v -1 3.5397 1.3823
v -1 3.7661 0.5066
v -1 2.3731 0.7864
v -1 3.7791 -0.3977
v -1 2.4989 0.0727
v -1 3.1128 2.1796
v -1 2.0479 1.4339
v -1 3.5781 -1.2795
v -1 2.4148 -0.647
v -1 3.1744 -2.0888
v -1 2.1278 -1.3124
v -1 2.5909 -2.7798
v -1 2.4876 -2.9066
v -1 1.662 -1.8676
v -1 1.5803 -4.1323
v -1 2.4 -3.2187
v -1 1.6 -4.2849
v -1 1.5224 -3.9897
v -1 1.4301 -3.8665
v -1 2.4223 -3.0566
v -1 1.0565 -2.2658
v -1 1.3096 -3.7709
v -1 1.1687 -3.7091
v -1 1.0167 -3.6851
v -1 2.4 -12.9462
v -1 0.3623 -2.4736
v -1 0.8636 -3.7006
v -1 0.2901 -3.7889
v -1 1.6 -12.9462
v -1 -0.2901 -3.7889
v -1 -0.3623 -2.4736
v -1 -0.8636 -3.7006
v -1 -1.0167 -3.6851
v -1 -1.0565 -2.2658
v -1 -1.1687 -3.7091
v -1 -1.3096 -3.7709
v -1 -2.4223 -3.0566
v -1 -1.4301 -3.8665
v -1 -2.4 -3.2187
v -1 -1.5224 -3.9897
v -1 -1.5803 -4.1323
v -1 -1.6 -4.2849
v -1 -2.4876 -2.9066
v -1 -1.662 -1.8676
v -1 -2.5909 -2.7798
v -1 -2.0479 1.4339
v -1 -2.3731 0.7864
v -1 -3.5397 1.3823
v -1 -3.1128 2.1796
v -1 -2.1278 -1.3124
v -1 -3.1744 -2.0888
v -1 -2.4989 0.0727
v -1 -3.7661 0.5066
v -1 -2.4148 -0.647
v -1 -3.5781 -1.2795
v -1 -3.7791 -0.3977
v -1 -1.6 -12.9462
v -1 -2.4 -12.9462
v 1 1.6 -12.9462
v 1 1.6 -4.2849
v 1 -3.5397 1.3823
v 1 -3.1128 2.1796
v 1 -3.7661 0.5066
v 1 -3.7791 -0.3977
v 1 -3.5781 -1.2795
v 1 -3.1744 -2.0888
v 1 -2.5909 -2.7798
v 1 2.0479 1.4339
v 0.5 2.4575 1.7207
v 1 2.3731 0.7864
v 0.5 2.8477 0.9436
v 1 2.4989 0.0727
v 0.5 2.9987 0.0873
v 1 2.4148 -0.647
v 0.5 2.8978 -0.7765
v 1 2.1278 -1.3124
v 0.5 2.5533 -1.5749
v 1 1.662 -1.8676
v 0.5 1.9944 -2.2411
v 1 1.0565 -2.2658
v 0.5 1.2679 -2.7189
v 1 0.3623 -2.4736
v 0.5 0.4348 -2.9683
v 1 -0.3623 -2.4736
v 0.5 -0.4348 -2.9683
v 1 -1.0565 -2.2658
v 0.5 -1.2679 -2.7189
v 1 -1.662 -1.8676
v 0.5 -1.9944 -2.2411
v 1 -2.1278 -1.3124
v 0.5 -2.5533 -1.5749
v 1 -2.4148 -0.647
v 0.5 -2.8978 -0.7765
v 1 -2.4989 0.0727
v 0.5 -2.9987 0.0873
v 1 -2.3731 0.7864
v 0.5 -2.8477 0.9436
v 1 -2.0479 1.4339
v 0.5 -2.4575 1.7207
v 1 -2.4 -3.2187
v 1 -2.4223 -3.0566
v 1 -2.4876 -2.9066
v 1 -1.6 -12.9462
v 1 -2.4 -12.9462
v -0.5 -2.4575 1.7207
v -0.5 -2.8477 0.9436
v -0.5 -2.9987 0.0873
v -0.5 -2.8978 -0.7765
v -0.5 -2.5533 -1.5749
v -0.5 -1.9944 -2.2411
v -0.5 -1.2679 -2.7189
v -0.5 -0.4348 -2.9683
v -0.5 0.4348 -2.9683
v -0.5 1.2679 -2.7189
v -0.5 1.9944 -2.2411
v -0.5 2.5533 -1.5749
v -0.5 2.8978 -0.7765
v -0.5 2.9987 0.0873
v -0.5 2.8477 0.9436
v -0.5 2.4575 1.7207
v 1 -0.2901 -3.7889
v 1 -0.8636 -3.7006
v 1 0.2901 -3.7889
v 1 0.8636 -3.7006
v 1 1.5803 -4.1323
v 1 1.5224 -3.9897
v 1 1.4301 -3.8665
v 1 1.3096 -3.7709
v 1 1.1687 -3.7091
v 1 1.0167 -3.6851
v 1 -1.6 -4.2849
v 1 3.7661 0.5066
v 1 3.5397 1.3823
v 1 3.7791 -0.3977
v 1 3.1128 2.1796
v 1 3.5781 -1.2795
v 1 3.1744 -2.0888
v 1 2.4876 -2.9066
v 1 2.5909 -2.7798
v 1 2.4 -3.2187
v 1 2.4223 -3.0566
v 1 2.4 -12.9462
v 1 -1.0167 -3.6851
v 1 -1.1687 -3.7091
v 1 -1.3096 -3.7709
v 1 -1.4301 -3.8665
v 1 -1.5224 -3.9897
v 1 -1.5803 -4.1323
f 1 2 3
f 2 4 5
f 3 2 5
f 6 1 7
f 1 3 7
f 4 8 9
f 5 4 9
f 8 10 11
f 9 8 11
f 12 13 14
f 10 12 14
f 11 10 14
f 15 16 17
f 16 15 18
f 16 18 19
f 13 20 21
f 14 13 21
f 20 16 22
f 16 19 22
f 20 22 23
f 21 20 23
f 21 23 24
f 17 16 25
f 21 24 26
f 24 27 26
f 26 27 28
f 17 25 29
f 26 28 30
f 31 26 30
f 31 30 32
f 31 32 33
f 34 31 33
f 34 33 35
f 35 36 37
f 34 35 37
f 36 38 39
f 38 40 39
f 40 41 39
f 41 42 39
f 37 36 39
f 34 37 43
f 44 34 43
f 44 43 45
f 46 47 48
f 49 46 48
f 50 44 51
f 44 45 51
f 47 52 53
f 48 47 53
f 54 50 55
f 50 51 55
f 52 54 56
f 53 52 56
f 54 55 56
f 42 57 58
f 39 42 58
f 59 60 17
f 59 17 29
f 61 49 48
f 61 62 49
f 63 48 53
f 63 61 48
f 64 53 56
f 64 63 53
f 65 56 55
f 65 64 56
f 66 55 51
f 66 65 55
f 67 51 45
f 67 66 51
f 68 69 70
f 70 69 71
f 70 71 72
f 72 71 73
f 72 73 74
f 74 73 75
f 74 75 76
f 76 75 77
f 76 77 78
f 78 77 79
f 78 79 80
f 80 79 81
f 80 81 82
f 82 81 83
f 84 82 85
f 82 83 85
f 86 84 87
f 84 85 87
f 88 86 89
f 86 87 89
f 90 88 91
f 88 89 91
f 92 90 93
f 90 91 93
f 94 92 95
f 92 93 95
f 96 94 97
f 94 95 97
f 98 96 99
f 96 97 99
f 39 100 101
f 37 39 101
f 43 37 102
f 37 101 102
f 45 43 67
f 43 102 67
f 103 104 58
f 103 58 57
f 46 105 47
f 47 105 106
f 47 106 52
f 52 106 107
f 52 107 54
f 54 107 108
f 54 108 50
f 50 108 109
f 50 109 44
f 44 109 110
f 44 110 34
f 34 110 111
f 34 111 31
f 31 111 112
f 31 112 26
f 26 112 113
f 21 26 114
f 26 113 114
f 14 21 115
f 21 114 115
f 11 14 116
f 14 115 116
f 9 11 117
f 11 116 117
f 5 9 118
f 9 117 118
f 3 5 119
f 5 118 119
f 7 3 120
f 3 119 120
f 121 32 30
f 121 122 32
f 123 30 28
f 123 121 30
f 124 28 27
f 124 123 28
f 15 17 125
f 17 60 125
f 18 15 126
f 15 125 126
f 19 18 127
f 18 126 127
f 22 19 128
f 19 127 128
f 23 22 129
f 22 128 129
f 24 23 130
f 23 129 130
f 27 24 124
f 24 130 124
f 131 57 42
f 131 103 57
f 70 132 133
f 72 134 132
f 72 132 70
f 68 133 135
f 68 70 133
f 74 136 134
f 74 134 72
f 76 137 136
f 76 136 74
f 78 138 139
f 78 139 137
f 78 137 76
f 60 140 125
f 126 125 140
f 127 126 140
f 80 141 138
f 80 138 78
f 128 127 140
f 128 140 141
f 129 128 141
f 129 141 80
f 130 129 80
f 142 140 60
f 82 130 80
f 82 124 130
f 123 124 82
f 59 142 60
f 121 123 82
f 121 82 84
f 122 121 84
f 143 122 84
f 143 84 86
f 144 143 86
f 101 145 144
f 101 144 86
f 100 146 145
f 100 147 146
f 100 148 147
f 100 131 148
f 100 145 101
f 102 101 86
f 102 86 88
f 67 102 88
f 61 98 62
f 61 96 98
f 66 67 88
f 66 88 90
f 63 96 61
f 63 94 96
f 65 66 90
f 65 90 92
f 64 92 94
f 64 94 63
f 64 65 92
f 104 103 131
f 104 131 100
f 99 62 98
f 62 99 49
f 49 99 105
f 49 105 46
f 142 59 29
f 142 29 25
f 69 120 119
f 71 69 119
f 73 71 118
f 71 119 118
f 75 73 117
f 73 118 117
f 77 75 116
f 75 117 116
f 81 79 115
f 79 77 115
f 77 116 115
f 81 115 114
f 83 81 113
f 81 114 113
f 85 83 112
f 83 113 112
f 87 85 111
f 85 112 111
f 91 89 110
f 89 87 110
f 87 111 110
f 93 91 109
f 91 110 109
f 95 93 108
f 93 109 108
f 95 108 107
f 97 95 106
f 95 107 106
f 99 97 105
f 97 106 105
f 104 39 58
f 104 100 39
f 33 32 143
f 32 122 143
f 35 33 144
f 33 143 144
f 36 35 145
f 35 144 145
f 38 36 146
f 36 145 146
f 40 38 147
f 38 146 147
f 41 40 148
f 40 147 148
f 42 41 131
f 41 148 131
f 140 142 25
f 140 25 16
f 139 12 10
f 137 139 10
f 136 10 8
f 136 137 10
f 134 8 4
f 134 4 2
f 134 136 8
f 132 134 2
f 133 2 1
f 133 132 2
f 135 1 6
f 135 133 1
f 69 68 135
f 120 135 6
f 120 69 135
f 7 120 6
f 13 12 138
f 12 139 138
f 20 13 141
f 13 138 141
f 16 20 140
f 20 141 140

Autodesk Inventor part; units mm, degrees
ref_plane "YZ Plane" through (0, 0, 0) normal (1, 0, 0) x (0, 1, 0)
ref_plane "XZ Plane" through (0, 0, 0) normal (0, 1, 0) x (-1, 0, 0)
ref_plane "XY Plane" through (0, 0, 0) normal (0, 0, 1) x (1, 0, 0)
sketch "Sketch4" plane through (0, 0, 0) normal (0, 1, 0) x (-1, 0, 0)
  line L0 (1, -2.5) -> (1, -3.8)
  line L1 (1, -3.8) -> (-1, -3.8)
  line L2 (-1, -3.8) -> (-1, -2.5)
  line L3 (-1, -2.5) -> (-0.5, -3)
  line L4 (-0.5, -3) -> (0.5, -3)
  line L5 (0.5, -3) -> (1, -2.5)
  line L6 (0, 0) -> (-1.4783, 0)
  point P0 (0, -3)
  dimension "d21" = 1
  dimension "d22" = 3
  dimension "d24" = 0.8
  dimension "d32" = 0.5
revolve "Revolution1" add sketch "Sketch4" angle 250 mid plane about axis through (0, 0, 0) along (1, 0, 0)
sketch "Sketch5" plane through (1, 0, 0) normal (1, 0, 0) x (0, 0, -1)
  arc A0 (-2.1796, -3.1128) -> (-2.1796, 3.1128) centre (0, 0) ccw projected
  line L0 (2.9462, -2.4) -> (12.9462, -2.4)
  line L1 (12.9462, -2.4) -> (12.9462, -1.6)
  line L2 (12.9462, -1.6) -> (3.4467, -1.6)
  line L3 (3.4467, 1.6) -> (12.9462, 1.6)
  line L4 (12.9462, 1.6) -> (12.9462, 2.4)
  line L5 (12.9462, 2.4) -> (2.9462, 2.4)
  point P0 (0, 0)
  point P1 (12.9462, 2)
  point P2 (12.9462, -2)
  dimension "d26" = 0.8
  dimension "d27" = 10
  dimension "d28" = 4
  dimension "d10" = 1.5
  dimension "d11" = 0.8
  dimension "d12" = 6
  dimension "d13" = 5.5
  dimension "d14" = 0.5
  dimension "d15" = 0.8
  dimension "d16" = 8
extrude "Extrusion5" add sketch "Sketch5" against normal up to surface (2 mm away)
fillet "Fillet1" radius 0.6 4 edges at (0, 2.4, -2.9462) (0, 1.6, -3.4467) (0, -1.6, -3.4467) (0, -2.4, -2.9462)
sketch "Sketch1" plane through (0, 0, 0) normal (0, 1, 0) x (-1, 0, 0)
  line L0 (-1, 2.3) -> (0, 3.3)
  line L1 (0, 3.3) -> (1, 2.3)
  line L2 (1, 2.3) -> (1, 4.5)
  line L3 (1, 4.5) -> (-1, 4.5)
  line L4 (-1, 4.5) -> (-1, 2.3)
  line L5 (0, 0) -> (-2.1371, 0)
  line L6 (-1, -2.3) -> (0, -3.3)
  line L7 (0, -3.3) -> (1, -2.3)
  line L8 (1, -2.3) -> (1, -4.5)
  line L9 (1, -4.5) -> (-1, -4.5)
  line L10 (-1, -4.5) -> (-1, -2.3)
  dimension "d0" = 45
  dimension "d1" = 3.3
  dimension "d2" = 2
  dimension "d3" = 4.5
sketch "Sketch2" plane through (-1, 0, 4.5) normal (0, 0, 1) x (1, 0, 0)
  line L0 (0, 0) -> (2, 0) projected
  line L1 (2, 0) -> (2, -2)
  line L2 (2, -2) -> (-3, -2)
  line L3 (-3, -2) -> (0, 0)
  point P0 (1, 0)
  dimension "d6" = 2
  dimension "d7" = 5
properties part number "6mm lens mount"
